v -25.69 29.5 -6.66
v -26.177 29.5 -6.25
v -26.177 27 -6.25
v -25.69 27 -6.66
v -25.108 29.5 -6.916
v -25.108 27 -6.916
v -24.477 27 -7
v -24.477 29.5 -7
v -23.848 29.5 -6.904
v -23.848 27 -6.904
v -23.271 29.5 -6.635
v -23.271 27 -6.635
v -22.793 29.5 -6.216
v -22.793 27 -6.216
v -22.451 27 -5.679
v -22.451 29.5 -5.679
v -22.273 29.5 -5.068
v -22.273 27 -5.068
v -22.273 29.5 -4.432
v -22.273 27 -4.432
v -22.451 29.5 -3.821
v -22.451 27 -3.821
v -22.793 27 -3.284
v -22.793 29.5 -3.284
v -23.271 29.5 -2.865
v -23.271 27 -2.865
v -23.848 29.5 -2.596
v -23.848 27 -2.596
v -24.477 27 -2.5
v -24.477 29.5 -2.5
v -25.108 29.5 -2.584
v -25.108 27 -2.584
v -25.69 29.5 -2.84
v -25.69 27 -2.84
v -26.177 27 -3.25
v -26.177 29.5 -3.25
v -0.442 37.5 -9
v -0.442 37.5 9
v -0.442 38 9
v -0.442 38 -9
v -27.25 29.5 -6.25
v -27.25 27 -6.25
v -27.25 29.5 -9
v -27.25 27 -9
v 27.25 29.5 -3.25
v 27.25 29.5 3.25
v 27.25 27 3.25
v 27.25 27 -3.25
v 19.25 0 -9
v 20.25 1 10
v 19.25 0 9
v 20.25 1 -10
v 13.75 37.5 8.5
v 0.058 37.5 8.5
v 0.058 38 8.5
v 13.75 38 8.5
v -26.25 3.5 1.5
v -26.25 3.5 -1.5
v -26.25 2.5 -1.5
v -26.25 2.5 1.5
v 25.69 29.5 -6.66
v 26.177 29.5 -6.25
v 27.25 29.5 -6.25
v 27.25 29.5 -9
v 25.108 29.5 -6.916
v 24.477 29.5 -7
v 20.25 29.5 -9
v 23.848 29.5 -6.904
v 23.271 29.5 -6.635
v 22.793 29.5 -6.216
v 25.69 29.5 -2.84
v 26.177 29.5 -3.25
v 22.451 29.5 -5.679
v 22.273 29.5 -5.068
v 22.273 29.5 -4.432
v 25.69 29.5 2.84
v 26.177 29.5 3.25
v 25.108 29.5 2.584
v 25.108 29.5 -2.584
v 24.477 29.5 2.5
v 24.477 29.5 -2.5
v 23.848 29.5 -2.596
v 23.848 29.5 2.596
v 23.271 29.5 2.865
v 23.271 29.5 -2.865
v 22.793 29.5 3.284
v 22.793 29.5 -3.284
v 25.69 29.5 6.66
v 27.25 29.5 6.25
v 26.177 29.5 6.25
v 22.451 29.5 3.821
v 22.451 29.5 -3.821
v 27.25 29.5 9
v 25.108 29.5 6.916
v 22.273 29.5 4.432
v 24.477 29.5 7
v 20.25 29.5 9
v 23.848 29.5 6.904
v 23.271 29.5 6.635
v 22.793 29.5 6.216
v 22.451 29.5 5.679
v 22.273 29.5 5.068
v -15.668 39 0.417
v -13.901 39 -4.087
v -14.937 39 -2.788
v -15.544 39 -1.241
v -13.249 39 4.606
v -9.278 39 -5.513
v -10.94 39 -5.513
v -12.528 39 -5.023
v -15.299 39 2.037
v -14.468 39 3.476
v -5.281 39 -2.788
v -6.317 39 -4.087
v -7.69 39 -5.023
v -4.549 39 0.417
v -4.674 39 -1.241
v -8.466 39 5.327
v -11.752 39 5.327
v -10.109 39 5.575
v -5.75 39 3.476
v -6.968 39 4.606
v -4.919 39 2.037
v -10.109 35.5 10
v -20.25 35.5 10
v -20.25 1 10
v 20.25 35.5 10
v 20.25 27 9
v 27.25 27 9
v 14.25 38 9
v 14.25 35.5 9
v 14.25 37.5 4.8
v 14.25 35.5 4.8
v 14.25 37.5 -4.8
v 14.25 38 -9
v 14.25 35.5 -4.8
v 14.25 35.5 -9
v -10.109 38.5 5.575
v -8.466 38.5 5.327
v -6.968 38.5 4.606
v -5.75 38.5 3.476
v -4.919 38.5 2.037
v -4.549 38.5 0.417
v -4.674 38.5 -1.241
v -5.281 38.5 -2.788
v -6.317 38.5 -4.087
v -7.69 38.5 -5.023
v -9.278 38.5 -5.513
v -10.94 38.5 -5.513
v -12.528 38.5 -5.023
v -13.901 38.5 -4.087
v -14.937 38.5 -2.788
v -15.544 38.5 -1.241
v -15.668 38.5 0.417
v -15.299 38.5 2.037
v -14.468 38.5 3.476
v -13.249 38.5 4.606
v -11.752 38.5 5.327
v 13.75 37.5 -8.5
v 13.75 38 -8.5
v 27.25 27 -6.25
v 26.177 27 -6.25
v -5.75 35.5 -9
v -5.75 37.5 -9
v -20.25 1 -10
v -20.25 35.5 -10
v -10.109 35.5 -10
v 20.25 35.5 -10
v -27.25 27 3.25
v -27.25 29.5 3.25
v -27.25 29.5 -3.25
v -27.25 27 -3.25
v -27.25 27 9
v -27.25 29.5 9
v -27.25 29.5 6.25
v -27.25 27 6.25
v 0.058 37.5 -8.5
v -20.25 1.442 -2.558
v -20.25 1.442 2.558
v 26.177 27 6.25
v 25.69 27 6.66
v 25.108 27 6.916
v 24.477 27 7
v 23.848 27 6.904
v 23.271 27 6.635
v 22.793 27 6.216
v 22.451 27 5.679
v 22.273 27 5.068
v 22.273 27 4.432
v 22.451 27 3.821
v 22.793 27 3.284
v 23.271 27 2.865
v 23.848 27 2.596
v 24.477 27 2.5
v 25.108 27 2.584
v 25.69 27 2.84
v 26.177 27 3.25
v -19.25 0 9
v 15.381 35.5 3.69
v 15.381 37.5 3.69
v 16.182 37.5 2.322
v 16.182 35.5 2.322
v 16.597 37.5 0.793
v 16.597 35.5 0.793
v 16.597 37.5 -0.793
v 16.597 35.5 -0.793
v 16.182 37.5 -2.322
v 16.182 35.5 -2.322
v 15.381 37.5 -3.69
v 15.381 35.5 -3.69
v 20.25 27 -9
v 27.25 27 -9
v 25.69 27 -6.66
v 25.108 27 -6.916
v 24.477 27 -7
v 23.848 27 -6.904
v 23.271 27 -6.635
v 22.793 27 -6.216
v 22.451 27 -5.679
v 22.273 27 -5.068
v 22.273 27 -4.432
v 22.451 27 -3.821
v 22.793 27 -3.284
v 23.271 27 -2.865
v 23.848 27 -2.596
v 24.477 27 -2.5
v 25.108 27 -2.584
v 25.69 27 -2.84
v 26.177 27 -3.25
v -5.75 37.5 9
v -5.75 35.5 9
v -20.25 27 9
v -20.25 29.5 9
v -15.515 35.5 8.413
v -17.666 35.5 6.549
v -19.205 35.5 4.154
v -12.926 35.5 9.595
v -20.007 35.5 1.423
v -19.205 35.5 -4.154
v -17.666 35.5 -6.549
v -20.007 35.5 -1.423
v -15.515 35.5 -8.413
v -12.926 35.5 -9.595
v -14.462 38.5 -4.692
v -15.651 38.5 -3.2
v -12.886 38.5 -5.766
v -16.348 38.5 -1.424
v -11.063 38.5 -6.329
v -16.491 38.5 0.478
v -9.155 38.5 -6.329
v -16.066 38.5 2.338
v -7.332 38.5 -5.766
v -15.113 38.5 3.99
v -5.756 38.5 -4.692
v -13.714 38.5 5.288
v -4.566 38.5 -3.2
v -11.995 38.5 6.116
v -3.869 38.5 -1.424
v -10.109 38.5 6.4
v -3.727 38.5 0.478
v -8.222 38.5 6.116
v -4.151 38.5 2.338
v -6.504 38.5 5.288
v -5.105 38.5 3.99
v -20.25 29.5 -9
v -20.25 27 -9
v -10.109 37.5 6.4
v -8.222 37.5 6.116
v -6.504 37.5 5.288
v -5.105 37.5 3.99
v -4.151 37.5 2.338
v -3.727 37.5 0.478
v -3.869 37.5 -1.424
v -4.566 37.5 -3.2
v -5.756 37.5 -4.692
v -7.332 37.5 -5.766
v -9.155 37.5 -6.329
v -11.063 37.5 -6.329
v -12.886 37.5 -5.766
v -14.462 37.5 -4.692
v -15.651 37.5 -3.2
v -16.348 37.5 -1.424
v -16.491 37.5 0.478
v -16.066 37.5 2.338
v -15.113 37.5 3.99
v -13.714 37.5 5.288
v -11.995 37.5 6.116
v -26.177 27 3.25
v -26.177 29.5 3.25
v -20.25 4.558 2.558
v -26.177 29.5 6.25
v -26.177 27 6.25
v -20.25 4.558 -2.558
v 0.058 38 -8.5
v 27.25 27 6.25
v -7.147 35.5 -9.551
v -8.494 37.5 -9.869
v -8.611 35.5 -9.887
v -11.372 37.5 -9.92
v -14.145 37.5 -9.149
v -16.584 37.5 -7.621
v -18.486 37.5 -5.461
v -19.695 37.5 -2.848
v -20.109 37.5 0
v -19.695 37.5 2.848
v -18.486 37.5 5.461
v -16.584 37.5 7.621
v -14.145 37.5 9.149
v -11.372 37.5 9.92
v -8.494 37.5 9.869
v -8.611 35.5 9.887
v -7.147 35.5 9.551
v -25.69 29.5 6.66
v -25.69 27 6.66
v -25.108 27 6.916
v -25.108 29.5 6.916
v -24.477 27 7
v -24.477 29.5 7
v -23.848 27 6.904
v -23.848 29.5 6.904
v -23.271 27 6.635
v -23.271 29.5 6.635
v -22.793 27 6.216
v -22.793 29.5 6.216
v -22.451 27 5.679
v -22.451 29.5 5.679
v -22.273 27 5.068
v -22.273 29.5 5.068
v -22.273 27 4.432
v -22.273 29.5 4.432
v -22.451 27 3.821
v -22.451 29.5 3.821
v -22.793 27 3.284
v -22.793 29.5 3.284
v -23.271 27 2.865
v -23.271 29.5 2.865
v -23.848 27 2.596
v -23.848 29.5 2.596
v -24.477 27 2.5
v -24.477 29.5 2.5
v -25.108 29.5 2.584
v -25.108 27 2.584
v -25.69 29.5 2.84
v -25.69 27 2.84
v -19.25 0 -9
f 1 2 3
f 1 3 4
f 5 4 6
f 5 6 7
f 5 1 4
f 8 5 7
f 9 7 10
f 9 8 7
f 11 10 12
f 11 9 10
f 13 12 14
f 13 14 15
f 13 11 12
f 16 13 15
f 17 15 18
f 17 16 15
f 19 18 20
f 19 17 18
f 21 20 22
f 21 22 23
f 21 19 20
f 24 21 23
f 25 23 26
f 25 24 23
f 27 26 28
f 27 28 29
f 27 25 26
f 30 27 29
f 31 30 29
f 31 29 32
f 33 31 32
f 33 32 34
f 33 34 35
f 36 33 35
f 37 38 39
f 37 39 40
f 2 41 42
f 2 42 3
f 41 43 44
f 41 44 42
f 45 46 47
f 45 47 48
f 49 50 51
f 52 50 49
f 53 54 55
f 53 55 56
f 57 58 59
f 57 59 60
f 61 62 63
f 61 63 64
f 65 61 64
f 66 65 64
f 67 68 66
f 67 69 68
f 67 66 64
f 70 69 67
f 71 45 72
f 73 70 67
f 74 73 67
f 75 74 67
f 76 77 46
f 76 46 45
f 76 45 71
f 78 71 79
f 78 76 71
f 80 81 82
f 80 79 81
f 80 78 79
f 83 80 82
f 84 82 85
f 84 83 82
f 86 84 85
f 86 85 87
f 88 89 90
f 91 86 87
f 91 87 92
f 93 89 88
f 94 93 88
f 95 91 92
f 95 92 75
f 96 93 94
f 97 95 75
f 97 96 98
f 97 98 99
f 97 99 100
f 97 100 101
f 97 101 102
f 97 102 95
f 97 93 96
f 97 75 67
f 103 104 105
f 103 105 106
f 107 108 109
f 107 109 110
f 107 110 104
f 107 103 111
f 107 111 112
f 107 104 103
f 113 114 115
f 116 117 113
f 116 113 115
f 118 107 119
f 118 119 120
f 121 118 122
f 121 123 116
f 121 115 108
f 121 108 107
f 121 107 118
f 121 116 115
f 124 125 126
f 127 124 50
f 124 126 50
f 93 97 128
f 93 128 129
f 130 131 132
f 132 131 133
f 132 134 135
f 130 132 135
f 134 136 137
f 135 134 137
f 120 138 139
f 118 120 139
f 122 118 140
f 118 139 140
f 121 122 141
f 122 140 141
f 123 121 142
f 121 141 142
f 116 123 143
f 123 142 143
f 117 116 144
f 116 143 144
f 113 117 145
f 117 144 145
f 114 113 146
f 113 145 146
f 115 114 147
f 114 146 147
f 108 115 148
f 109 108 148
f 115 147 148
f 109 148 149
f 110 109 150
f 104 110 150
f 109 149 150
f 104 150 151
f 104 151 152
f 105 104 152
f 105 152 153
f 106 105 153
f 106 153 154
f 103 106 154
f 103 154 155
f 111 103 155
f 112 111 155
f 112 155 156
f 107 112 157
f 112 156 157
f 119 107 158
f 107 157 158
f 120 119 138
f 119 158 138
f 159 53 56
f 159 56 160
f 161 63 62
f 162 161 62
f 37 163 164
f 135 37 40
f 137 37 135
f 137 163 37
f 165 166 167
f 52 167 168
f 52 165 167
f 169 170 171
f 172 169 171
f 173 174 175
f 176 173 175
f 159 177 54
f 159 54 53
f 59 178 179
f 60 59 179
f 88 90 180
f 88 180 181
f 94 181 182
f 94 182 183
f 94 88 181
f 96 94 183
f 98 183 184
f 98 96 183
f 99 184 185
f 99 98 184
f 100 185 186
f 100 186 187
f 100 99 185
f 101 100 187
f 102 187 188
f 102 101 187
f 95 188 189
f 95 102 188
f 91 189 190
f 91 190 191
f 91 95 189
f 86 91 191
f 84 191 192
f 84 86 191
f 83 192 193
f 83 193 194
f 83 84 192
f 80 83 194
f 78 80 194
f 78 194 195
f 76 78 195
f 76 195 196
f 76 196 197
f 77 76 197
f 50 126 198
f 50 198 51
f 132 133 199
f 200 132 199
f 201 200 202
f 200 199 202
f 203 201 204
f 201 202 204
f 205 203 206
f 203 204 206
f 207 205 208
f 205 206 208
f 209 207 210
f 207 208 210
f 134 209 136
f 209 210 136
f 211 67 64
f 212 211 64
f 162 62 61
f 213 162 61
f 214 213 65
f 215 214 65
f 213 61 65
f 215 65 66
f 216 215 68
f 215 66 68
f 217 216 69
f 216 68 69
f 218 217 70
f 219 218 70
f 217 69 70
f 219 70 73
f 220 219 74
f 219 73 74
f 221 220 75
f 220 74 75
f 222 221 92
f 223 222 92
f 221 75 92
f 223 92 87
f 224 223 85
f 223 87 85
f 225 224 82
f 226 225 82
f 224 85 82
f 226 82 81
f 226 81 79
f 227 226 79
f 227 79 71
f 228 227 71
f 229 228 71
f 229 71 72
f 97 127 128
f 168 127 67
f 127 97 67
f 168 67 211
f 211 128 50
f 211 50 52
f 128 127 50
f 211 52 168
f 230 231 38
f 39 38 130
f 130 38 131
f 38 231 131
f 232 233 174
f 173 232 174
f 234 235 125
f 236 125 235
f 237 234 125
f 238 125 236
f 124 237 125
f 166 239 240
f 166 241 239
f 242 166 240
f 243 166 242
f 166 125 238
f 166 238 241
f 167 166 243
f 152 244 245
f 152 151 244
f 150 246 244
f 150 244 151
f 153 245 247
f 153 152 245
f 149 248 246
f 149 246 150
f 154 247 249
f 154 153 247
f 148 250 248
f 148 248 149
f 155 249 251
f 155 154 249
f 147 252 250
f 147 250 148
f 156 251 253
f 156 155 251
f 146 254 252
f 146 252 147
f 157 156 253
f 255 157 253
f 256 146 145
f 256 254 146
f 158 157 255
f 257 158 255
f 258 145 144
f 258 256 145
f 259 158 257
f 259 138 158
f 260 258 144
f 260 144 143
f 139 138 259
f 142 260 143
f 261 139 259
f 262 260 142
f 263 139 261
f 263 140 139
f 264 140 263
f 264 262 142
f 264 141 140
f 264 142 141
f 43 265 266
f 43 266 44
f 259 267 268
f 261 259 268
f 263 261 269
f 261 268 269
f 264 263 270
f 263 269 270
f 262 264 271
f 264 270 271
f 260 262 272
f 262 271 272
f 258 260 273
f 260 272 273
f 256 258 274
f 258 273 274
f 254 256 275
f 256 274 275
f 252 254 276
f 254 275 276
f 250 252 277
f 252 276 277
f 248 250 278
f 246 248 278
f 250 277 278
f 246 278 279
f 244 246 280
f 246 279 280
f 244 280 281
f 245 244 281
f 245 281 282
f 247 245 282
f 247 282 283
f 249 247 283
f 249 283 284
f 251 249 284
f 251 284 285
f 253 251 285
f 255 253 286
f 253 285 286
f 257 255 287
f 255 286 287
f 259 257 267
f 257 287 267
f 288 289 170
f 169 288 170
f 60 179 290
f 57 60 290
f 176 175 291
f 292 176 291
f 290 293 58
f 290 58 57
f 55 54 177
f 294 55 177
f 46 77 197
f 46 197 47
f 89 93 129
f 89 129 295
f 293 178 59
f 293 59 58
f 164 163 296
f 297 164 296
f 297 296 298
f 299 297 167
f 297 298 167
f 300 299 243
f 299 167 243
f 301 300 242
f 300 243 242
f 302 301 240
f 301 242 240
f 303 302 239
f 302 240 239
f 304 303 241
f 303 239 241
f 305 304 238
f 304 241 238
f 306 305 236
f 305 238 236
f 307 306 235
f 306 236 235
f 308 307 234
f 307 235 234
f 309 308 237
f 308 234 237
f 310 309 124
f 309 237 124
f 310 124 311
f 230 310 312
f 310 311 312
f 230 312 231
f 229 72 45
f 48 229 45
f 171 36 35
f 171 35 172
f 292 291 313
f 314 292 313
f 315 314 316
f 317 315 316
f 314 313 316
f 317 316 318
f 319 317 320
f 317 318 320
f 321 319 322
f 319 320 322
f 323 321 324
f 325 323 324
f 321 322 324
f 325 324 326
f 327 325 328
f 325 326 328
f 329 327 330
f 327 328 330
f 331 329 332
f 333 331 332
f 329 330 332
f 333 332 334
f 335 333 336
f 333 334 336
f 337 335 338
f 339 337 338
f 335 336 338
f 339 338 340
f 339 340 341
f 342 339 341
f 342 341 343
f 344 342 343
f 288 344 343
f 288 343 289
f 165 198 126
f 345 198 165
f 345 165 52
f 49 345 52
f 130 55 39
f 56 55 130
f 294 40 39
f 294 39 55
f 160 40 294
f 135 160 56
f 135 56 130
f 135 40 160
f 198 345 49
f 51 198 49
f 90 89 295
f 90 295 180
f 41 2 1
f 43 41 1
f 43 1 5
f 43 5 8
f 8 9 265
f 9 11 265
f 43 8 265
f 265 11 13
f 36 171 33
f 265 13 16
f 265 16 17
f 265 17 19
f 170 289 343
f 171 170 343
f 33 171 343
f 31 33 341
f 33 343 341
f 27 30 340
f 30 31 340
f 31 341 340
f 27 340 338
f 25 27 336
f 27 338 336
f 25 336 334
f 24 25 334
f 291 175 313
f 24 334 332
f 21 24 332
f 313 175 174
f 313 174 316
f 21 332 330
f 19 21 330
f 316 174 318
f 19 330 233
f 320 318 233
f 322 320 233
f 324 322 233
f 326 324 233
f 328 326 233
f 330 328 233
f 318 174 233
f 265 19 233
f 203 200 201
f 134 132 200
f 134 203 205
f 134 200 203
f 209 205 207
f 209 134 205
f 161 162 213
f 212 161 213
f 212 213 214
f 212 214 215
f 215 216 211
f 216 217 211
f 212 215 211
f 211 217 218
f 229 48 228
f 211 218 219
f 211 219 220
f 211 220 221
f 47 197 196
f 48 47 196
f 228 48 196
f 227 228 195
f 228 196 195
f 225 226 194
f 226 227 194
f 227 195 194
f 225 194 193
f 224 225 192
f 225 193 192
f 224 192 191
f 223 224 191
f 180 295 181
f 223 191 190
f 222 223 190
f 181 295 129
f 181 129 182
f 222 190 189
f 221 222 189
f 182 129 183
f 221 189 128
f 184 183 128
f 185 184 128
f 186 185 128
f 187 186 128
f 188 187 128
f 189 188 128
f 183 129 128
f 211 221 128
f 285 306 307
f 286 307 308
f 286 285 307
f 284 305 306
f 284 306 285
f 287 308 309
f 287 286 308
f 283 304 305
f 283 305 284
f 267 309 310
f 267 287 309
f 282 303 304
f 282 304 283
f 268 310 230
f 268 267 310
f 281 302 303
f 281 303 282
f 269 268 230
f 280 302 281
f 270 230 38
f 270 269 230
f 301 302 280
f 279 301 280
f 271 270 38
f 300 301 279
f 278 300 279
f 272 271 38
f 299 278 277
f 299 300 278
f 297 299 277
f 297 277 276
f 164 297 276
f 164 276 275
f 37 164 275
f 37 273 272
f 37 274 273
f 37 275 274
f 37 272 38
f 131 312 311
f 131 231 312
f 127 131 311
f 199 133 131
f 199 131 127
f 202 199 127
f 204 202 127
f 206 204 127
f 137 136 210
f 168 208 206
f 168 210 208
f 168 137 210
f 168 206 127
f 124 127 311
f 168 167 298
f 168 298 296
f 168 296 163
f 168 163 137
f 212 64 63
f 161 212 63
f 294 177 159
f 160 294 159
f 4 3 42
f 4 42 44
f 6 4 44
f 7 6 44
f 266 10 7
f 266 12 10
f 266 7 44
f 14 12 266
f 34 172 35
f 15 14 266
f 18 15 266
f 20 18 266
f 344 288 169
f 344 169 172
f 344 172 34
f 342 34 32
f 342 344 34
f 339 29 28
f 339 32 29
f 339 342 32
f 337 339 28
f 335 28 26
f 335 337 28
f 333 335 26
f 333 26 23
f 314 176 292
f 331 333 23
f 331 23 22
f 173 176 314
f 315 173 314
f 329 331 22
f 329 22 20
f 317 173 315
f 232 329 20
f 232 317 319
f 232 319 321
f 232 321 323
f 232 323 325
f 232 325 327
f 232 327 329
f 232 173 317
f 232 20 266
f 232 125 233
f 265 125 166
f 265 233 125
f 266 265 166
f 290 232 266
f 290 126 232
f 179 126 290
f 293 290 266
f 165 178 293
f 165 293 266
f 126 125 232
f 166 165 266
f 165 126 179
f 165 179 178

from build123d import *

# Parameters (mm, degrees)
SKETCH1_W            = 40.5
SKETCH1_H            = 20
BOSS_EXTRUDE1_DEPTH  = 35.5
BOSS_EXTRUDE2_DEPTH  = 2
SKETCH3_R            = 6.4
BOSS_EXTRUDE3_DEPTH  = 1
SKETCH4_R            = 5.575
BOSS_EXTRUDE4_DEPTH  = 0.5
BOSS_EXTRUDE5_DEPTH  = 2.5
MIRROR2_COPY_1_DEPTH = 2.5
CHAMFER1_SIZE        = 1
SKETCH6_W            = 3
SKETCH6_H            = 1
BOSS_EXTRUDE6_DEPTH  = 6
DRAFT1_ANGLE         = 10
SKETCH7_W            = 14.691761142
SKETCH7_H            = 18
SKETCH7_W_2          = 13.691761142
SKETCH7_H_2          = 17
BOSS_EXTRUDE7_DEPTH  = 0.5


with BuildPart() as part:
    # Sketch1 → Boss-Extrude1 (new body)
    with BuildSketch(Plane(origin=(0, 0, 0), x_dir=(1, 0, 0), z_dir=(0, 1, 0))):
        Rectangle(SKETCH1_W, SKETCH1_H)
    extrude(amount=BOSS_EXTRUDE1_DEPTH)

    # Sketch2 → Boss-Extrude2 (add)
    with BuildSketch(Plane(origin=(0, 35.5, 0), x_dir=(1, 0, 0), z_dir=(0, 1, 0))):
        with BuildLine():
            Line((-5.75, -9), (14.25, -9))
            Line((14.25, -9), (14.25, -4.8))
            ThreePointArc((14.25, -4.8), (16.65, 0), (14.25, 4.8))
            Line((14.25, 4.8), (14.25, 9))
            Line((14.25, 9), (-5.75, 9))
            ThreePointArc((-5.75, 9), (-20.108898944, 0), (-5.75, -9))
        make_face()
    extrude(amount=BOSS_EXTRUDE2_DEPTH)

    # Sketch3 → Boss-Extrude3 (add)
    with BuildSketch(Plane(origin=(0, 37.5, 0), x_dir=(1, 0, 0), z_dir=(0, 1, 0))):
        with Locations(Location((-10.108898944, 0, 0), (0, 0, 270))):
            Circle(SKETCH3_R)
    extrude(amount=BOSS_EXTRUDE3_DEPTH)

    # Sketch4 → Boss-Extrude4 (add)
    with BuildSketch(Plane(origin=(0, 38.5, 0), x_dir=(1, 0, 0), z_dir=(0, 1, 0))):
        with Locations(Location((-10.108898944, 0, 0), (0, 0, 270))):
            Circle(SKETCH4_R)
    extrude(amount=BOSS_EXTRUDE4_DEPTH)

    # Sketch5 → Boss-Extrude5 (add)
    with BuildSketch(Plane(origin=(0, 29.5, 0), x_dir=(1, 0, 0), z_dir=(0, 1, 0))):
        with BuildLine():
            Line((20.25, 9), (27.25, 9))
            Line((27.25, 9), (27.25, 6.25))
            Line((27.25, 6.25), (26.177050983, 6.25))
            ThreePointArc((26.177050983, 6.25), (22.25, 4.75), (26.177050983, 3.25))
            Line((26.177050983, 3.25), (27.25, 3.25))
            Line((27.25, 3.25), (27.25, 0))
            Line((27.25, 0), (20.25, 0))
            Line((20.25, 0), (20.25, 9))
        make_face()
    boss_extrude5 = extrude(amount=-BOSS_EXTRUDE5_DEPTH)

    # Mirror1: Boss-Extrude5 across plane
    add(boss_extrude5.mirror(Plane(origin=(0, 0, 0), x_dir=(0, 0, 1), z_dir=(1, 0, 0))))

    # Mirror2: Boss-Extrude5 across plane
    add(boss_extrude5.mirror(Plane.XY))

    # Mirror2 copy 1 sketch → Mirror2 copy 1 (add)
    with BuildSketch(Plane(origin=(0, 29.5, 0), x_dir=(-1, 0, 0), z_dir=(0, 1, 0))):
        with BuildLine():
            Line((20.25, 9), (27.25, 9))
            Line((27.25, 9), (27.25, 6.25))
            Line((27.25, 6.25), (26.177050983, 6.25))
            ThreePointArc((26.177050983, 6.25), (22.25, 4.75), (26.177050983, 3.25))
            Line((26.177050983, 3.25), (27.25, 3.25))
            Line((27.25, 3.25), (27.25, 0))
            Line((27.25, 0), (20.25, 0))
            Line((20.25, 0), (20.25, 9))
        make_face()
    extrude(amount=-MIRROR2_COPY_1_DEPTH)

    # Chamfer1
    chamfer1_edges = [part.edges().sort_by_distance(p)[0] for p in [
        (0, 0, -10),
        (20.25, 0, 0),
        (0, 0, 10),
        (-20.25, 0, 0),
    ]]
    chamfer(chamfer1_edges, length=CHAMFER1_SIZE)

    # Sketch6 → Boss-Extrude6 (add)
    with BuildSketch(Plane.ZY.offset(20.25)):
        with Locations((0, 3)):
            Rectangle(SKETCH6_W, SKETCH6_H)
    extrude(amount=BOSS_EXTRUDE6_DEPTH)

    # Draft1
    draft1_faces = [part.faces().sort_by_distance(p)[0] for p in [
        (-23.25, 3, -1.5),
        (-23.25, 3.5, 0),
        (-23.25, 3, 1.5),
        (-23.25, 2.5, 0),
    ]]
    draft(draft1_faces, Plane(origin=(-26.25, 0, 0), x_dir=(0, 0, -1), z_dir=(-1, 0, 0)), DRAFT1_ANGLE)

    # Sketch7 → Boss-Extrude7 (add)
    with BuildSketch(Plane(origin=(0, 37.5, 0), x_dir=(1, 0, 0), z_dir=(0, 1, 0))):
        with Locations((6.904119429, 0)):
            Rectangle(SKETCH7_W, SKETCH7_H)
        with Locations((6.904119429, 0)):
            Rectangle(SKETCH7_W_2, SKETCH7_H_2, mode=Mode.SUBTRACT)
    extrude(amount=BOSS_EXTRUDE7_DEPTH)


solid = part.part
